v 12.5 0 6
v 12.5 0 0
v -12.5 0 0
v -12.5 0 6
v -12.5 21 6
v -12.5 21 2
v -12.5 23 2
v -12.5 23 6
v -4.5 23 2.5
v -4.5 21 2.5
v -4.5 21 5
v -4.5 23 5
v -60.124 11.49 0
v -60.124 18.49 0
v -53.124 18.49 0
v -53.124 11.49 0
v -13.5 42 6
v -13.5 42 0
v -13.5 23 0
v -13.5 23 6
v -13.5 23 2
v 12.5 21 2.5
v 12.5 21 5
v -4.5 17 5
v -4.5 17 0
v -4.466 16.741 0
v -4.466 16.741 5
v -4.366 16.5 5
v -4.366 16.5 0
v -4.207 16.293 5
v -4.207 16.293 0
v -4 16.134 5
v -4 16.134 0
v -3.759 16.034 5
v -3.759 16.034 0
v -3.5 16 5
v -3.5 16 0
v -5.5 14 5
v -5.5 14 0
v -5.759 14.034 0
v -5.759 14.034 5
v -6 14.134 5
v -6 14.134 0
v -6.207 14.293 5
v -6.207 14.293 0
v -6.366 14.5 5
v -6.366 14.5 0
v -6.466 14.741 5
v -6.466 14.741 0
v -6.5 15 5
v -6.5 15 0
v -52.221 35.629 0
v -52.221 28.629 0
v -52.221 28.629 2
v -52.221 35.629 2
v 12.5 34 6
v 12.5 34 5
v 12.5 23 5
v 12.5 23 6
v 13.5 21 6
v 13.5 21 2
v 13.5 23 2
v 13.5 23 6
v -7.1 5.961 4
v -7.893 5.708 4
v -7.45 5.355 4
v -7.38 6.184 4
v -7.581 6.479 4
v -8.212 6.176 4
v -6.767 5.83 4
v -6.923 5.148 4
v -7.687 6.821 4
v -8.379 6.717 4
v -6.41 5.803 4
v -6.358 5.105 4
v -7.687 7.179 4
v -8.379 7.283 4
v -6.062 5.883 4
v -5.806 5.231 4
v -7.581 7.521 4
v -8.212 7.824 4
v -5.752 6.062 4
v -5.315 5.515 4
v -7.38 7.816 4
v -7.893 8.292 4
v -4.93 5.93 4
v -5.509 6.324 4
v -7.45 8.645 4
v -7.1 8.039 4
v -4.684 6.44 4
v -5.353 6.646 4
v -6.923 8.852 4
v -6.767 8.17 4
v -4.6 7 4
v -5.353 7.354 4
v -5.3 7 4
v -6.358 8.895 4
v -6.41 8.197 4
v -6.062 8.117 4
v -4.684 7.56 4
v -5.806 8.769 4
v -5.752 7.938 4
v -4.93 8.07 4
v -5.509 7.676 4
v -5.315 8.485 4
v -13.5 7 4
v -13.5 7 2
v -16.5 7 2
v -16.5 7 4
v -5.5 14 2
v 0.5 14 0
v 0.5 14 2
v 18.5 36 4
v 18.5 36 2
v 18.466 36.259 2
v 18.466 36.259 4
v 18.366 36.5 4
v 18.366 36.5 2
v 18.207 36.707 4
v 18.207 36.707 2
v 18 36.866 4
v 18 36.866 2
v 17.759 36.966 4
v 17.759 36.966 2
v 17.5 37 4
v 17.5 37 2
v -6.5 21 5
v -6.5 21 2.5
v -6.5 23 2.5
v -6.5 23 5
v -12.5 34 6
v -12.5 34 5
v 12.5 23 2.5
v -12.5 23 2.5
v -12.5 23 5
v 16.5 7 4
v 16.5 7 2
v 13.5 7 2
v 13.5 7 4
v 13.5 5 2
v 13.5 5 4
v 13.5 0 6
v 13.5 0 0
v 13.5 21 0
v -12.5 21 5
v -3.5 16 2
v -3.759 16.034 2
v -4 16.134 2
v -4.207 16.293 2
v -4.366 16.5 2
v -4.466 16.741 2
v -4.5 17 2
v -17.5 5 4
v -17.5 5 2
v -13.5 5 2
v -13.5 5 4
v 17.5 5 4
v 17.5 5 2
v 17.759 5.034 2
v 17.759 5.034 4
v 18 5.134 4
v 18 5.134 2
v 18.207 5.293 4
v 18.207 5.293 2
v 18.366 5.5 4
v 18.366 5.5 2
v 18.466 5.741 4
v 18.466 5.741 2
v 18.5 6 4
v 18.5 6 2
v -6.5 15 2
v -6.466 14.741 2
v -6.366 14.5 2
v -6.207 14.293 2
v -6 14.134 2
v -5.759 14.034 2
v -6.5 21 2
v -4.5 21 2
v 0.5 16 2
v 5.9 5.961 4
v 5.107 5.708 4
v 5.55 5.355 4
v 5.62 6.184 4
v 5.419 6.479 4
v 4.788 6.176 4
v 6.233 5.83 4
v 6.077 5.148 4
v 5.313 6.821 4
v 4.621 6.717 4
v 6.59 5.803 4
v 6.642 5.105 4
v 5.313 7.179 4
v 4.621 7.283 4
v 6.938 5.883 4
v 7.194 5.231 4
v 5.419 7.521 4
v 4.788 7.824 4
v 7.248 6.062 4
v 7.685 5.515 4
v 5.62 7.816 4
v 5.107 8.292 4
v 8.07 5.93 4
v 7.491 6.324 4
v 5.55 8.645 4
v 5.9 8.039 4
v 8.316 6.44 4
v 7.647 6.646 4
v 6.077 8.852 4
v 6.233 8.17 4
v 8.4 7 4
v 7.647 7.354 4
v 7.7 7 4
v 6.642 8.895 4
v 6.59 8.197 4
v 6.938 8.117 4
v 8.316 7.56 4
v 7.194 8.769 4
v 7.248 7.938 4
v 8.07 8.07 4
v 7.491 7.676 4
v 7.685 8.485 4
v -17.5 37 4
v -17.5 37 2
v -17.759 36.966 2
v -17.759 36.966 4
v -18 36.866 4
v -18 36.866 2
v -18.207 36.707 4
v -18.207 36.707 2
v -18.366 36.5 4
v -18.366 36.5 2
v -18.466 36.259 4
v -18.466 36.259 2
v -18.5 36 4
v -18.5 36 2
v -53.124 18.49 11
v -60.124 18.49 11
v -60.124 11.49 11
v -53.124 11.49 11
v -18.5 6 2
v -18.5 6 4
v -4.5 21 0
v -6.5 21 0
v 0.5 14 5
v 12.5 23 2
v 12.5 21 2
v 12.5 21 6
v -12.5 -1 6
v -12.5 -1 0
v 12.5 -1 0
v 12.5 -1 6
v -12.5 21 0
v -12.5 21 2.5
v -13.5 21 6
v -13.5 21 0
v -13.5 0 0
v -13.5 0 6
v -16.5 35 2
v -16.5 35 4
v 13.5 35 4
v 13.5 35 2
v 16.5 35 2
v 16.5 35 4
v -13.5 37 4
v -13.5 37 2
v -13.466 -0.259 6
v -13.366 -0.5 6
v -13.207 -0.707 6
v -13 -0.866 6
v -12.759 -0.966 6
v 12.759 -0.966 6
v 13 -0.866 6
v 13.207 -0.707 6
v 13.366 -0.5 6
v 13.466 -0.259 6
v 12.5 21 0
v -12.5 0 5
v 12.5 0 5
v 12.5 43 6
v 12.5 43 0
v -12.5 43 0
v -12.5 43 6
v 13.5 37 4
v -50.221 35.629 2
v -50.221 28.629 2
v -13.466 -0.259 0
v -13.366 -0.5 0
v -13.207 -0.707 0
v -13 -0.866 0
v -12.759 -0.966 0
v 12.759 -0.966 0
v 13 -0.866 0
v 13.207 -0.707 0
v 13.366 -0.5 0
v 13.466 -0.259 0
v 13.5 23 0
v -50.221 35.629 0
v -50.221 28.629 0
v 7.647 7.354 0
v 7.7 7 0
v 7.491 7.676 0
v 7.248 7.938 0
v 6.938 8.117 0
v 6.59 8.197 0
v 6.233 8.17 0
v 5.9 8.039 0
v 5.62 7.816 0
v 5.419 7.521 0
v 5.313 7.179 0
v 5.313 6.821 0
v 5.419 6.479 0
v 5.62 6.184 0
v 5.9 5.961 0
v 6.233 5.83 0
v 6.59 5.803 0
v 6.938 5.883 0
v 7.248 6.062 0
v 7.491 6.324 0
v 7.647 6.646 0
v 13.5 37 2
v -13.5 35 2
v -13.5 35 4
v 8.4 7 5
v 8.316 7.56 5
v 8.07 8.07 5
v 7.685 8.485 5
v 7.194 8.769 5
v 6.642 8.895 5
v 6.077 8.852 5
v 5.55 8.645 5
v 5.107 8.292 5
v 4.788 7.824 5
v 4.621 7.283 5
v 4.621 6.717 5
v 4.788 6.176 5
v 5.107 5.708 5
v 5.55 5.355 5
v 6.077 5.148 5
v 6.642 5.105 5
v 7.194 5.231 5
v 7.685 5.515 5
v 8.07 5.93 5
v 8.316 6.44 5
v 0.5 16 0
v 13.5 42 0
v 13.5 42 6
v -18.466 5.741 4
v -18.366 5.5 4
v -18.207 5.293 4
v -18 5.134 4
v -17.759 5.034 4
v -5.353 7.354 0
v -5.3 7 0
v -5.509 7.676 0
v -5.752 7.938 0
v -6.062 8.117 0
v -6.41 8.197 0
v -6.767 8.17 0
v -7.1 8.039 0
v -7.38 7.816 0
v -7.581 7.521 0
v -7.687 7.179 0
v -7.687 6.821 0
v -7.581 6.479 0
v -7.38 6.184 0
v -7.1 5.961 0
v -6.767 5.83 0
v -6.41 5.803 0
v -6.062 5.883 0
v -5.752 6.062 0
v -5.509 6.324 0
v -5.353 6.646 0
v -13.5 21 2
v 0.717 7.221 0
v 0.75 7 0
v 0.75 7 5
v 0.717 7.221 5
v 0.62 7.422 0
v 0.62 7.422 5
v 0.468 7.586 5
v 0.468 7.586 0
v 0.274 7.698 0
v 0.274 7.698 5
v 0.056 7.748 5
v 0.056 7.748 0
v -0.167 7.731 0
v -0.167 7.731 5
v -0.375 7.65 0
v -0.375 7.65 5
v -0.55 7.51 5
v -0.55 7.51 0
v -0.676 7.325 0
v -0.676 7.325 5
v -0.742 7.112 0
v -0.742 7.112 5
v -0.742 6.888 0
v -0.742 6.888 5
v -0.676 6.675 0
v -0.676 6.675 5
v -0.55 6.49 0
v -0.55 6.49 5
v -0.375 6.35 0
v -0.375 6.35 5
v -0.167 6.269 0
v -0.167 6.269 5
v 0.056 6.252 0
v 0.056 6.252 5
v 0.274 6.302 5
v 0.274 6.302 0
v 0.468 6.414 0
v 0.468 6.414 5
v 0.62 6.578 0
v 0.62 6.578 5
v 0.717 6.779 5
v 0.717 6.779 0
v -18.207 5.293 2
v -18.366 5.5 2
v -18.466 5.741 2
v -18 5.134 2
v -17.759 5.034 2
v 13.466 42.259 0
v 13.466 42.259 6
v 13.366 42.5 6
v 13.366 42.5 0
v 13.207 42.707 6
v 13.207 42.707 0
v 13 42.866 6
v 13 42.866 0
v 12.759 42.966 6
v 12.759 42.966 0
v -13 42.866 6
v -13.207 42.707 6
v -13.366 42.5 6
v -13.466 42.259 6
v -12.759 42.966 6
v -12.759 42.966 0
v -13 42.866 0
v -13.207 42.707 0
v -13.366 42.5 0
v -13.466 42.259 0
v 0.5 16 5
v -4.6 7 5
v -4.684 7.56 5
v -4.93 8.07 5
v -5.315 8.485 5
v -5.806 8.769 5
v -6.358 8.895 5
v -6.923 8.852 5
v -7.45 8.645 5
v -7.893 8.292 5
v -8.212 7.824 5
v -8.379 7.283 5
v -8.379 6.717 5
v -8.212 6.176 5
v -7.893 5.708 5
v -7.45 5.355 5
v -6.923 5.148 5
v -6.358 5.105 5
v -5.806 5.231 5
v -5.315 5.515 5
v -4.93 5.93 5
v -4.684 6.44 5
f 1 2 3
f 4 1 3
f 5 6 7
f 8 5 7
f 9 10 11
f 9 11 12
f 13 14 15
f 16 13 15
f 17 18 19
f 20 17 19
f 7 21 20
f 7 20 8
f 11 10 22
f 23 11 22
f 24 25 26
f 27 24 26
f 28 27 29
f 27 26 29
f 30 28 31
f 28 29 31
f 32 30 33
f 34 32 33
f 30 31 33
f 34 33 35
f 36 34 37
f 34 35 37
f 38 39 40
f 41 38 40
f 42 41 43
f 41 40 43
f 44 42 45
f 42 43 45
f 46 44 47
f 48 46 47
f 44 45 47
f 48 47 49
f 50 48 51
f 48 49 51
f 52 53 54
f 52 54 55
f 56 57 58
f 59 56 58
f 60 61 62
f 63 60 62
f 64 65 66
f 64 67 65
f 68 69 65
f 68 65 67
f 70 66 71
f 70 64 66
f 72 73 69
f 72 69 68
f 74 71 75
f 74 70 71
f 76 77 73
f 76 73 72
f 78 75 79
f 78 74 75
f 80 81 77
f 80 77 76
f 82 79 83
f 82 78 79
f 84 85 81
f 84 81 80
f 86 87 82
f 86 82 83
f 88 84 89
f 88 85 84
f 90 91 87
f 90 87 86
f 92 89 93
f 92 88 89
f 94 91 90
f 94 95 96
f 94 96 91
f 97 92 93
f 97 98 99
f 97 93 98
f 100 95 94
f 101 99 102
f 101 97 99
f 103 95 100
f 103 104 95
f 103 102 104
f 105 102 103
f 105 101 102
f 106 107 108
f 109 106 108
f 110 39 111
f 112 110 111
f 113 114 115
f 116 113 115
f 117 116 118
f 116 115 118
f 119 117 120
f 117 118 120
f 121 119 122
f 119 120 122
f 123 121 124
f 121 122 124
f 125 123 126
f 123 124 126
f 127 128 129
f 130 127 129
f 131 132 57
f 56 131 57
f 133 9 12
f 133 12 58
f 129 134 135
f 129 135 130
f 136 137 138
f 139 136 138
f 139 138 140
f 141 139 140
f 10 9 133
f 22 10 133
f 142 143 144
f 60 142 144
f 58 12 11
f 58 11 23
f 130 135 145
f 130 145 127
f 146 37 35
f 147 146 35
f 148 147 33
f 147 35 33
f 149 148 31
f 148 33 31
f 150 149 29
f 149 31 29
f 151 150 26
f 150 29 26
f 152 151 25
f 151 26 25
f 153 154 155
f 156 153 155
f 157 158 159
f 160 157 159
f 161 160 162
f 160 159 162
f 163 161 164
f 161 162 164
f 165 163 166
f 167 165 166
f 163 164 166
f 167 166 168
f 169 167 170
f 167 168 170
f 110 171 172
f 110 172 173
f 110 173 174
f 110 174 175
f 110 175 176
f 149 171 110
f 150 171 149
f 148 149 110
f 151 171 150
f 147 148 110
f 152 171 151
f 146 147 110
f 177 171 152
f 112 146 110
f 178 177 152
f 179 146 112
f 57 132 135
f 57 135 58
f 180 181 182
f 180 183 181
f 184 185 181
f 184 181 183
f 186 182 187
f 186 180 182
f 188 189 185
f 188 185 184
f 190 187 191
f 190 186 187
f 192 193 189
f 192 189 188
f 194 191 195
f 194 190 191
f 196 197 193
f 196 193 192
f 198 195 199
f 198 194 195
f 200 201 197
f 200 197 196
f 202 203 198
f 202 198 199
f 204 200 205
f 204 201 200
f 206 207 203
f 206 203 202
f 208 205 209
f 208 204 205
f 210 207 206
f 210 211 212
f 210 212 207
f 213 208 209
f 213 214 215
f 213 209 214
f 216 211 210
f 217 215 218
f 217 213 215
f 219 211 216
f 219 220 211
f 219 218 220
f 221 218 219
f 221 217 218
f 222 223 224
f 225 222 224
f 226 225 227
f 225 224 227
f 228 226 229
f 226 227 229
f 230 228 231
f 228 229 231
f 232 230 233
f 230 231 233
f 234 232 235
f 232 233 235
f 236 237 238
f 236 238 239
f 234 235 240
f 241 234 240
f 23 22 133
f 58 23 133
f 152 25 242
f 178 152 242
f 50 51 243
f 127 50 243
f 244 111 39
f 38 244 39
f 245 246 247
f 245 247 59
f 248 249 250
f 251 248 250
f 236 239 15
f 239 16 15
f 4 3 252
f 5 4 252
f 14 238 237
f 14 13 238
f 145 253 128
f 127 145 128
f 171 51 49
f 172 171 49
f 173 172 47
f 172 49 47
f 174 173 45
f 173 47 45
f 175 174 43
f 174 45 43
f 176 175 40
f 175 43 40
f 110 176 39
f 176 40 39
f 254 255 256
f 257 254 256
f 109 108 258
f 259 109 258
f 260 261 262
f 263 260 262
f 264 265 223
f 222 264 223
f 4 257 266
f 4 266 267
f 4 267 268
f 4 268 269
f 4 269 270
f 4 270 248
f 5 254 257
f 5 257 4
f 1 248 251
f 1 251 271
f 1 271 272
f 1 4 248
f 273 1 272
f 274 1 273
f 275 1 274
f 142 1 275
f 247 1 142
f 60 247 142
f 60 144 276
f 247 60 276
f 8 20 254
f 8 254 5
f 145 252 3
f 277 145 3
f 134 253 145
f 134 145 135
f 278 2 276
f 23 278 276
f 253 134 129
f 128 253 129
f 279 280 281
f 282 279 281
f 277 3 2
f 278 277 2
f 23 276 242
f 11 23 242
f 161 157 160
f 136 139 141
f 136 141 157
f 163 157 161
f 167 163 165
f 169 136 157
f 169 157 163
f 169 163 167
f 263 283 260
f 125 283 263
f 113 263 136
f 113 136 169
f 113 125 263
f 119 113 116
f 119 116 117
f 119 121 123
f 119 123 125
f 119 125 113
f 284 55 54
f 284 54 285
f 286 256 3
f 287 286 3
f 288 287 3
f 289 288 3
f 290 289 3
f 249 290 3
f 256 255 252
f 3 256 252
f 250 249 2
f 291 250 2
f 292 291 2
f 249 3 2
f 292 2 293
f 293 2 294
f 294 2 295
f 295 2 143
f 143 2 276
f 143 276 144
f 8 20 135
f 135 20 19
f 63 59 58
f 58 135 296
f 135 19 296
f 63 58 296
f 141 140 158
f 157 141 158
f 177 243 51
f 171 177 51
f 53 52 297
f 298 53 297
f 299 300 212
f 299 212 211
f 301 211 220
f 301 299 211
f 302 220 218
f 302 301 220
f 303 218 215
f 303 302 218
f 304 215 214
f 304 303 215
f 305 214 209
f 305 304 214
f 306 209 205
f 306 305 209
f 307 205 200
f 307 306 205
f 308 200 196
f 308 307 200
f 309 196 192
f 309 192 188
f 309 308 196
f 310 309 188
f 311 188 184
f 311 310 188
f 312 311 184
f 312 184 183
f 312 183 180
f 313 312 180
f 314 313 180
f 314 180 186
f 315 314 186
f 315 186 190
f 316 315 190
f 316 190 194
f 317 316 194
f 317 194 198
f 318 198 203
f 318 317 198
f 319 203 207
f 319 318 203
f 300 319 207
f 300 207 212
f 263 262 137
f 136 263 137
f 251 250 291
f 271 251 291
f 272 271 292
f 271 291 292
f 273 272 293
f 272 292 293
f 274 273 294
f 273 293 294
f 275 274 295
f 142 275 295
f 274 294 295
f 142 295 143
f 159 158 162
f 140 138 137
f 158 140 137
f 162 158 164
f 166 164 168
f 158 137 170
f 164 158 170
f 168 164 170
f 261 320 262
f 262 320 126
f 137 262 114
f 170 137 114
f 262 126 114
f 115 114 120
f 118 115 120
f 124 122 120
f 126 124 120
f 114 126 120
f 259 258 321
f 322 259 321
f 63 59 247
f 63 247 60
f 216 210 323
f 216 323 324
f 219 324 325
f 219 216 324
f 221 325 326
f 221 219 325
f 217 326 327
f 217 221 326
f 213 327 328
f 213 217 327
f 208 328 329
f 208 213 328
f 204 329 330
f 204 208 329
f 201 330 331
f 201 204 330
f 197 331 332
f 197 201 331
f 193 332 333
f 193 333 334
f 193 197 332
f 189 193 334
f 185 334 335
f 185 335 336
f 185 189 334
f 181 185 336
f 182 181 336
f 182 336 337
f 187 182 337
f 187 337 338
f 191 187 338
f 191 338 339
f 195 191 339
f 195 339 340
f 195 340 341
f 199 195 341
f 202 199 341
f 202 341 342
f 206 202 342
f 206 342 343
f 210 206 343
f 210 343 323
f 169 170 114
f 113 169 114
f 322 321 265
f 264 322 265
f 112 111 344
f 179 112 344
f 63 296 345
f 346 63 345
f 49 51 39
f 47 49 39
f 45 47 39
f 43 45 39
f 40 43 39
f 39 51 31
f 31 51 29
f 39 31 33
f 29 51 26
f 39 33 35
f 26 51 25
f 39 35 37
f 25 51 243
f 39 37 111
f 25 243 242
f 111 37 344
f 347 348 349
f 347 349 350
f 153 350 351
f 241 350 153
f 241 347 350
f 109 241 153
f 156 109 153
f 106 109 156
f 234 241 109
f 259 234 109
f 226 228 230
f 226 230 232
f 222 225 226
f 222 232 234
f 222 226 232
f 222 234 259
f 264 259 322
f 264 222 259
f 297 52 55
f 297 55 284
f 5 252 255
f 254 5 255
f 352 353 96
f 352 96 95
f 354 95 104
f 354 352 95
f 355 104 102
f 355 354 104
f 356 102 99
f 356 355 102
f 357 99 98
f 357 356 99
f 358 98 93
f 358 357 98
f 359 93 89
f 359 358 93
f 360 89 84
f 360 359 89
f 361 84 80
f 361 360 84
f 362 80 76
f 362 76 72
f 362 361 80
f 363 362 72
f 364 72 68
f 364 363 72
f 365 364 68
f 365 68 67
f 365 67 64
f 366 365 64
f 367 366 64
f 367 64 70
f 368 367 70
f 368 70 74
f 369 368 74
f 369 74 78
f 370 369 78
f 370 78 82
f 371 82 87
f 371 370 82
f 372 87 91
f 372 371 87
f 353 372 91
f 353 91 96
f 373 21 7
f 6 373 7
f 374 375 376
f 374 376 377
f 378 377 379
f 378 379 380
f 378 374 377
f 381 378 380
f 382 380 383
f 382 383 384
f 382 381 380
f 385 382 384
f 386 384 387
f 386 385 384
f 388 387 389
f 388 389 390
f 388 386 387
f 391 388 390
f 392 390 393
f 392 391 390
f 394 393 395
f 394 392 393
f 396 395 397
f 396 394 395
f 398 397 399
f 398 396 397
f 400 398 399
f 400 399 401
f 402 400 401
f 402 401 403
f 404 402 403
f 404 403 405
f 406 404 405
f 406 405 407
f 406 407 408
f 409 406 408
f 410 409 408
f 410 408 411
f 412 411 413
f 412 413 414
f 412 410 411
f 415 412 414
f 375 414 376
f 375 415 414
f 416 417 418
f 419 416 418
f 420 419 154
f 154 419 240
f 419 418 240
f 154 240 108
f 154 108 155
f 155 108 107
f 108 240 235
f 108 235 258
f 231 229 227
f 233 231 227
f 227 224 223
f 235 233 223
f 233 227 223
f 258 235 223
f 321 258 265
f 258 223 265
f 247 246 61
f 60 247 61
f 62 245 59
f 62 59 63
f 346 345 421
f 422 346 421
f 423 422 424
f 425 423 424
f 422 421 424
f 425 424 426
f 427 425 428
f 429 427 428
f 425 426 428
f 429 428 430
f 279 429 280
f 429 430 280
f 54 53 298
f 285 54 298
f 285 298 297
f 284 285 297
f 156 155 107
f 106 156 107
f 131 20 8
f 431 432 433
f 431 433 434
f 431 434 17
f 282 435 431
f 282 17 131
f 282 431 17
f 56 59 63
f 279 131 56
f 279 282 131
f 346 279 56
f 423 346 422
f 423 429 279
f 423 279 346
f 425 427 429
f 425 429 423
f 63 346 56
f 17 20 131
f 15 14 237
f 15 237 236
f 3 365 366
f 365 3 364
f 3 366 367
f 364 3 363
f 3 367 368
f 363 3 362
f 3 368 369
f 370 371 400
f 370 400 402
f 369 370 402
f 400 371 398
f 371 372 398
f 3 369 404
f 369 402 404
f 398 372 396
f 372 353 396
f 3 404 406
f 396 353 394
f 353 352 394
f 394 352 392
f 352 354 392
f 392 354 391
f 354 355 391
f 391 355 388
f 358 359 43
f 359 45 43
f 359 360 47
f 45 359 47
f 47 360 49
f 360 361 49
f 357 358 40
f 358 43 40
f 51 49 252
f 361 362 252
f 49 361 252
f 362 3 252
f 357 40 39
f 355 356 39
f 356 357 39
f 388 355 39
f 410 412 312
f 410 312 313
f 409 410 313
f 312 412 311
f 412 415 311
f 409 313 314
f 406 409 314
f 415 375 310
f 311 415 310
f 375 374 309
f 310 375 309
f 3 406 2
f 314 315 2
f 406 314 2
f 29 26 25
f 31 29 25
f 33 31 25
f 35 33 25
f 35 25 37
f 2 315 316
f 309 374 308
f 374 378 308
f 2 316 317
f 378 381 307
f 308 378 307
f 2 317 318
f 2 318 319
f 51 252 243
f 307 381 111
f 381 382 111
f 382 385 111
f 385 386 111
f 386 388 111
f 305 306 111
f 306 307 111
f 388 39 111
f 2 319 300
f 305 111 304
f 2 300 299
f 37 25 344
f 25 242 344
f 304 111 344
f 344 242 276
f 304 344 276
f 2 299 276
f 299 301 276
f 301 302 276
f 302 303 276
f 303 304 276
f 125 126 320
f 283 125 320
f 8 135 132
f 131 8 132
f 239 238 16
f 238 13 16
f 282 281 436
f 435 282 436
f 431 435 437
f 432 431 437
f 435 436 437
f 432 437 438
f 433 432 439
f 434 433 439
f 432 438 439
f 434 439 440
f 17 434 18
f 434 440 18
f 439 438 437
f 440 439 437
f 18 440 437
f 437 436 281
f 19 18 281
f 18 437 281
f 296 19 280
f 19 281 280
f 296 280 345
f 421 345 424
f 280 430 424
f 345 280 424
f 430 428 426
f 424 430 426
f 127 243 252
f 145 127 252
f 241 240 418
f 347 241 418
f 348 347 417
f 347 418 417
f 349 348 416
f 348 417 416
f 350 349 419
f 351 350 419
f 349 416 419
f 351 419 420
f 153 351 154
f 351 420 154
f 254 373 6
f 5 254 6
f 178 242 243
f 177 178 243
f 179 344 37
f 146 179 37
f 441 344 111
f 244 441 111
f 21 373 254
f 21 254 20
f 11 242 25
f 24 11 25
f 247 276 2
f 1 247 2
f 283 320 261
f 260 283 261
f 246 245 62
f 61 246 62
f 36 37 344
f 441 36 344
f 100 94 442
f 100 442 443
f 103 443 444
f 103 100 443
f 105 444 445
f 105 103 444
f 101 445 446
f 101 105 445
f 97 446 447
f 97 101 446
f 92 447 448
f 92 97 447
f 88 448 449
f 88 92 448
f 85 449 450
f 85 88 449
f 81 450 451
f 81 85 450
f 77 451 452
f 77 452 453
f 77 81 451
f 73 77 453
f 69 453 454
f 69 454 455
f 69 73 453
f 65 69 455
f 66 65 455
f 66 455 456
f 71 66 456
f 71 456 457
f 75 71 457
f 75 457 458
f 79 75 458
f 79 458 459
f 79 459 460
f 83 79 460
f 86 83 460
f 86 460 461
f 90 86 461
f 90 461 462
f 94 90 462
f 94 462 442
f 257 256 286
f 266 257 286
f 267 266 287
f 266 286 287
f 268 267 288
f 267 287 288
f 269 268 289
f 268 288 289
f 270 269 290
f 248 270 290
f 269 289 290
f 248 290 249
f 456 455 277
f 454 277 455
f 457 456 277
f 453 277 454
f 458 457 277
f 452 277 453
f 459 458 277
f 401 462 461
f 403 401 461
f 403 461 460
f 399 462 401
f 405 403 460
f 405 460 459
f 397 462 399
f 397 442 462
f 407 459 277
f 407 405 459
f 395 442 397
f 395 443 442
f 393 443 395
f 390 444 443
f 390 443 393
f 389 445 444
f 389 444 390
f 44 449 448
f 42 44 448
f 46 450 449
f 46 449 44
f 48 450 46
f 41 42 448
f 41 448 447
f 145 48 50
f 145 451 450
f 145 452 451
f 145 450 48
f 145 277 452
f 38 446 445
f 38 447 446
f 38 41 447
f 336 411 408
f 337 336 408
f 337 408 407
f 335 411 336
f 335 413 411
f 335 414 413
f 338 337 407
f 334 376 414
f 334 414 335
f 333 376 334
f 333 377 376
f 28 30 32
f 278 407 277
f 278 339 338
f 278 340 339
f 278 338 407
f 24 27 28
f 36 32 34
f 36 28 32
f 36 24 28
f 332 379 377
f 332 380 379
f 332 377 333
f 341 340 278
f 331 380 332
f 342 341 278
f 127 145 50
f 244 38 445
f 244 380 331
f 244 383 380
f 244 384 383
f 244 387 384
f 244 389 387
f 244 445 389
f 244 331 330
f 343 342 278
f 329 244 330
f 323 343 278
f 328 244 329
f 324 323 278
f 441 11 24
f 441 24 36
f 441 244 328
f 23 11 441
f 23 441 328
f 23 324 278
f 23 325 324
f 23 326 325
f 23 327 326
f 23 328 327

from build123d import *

# Parameters (mm, degrees)
F1_DEPTH  = 6
F0_R      = 1.9
F0_R_2    = 0.75
F2_DEPTH  = 5
F3_START  = 2
F3_DEPTH  = 2
F4_START  = 2
F0_W      = 1
F0_H      = 2
F4_DEPTH  = 4
F5_START  = 2.5
F0_W_2    = 6
F5_DEPTH  = 2.5
F0_W_3    = 17
F6_DEPTH  = 2
F0_R_3    = 1.2
F7_DEPTH  = 4
F8_W      = 2
F8_H      = 7
F9_DEPTH  = 2
F8_W_2    = 7
F10_DEPTH = 9


with BuildPart() as f1:
    # F0 (on Top) → F1 (new body)
    with BuildSketch(Plane.XY):
        with BuildLine():
            Line((12.5, 0), (0, 0))
            Line((0, 0), (-12.5, 0))
            Line((-12.5, 0), (-12.5, 21))
            Line((-12.5, 21), (-13.5, 21))
            Line((-13.5, 21), (-13.5, 7))
            Line((-13.5, 7), (-13.5, 5))
            Line((-13.5, 5), (-13.5, 0))
            ThreePointArc((-13.5, 0), (-13.2071067812, -0.7071067812), (-12.5, -1))
            Line((-12.5, -1), (0, -1))
            Line((0, -1), (12.5, -1))
            ThreePointArc((12.5, -1), (13.2071067812, -0.7071067812), (13.5, 0))
            Line((13.5, 0), (13.5, 5))
            Line((13.5, 5), (13.5, 7))
            Line((13.5, 7), (13.5, 21))
            Line((13.5, 21), (12.5, 21))
            Line((12.5, 21), (12.5, 0))
        make_face()
    extrude(amount=F1_DEPTH)


with BuildPart() as f1b:
    # F0 (on Top) → F1, piece 2 (new body)
    with BuildSketch(Plane.XY):
        with BuildLine():
            Line((-13.5, 23), (-12.5, 23))
            Line((-12.5, 23), (-12.5, 34))
            Line((-12.5, 34), (0, 34))
            Line((0, 34), (12.5, 34))
            Line((12.5, 34), (12.5, 23))
            Line((12.5, 23), (13.5, 23))
            Line((13.5, 23), (13.5, 35))
            Line((13.5, 35), (13.5, 37))
            Line((13.5, 37), (13.5, 42))
            ThreePointArc((13.5, 42), (13.2071067812, 42.7071067812), (12.5, 43))
            Line((12.5, 43), (0, 43))
            Line((0, 43), (-12.5, 43))
            ThreePointArc((-12.5, 43), (-13.2071067812, 42.7071067812), (-13.5, 42))
            Line((-13.5, 42), (-13.5, 37))
            Line((-13.5, 37), (-13.5, 35))
            Line((-13.5, 35), (-13.5, 23))
        make_face()
    extrude(amount=F1_DEPTH)

    # F0 (on Top) → F2, piece 2 (join)
    with BuildSketch(Plane.XY):
        Polygon((-12.5, 34), (-12.5, 23), (-6.5, 23), (-4.5, 23), (12.5, 23), (12.5, 34), (0, 34), align=None)
    extrude(amount=F2_DEPTH)


with BuildPart() as f2:
    # F0 (on Top) → F2 (new body)
    with BuildSketch(Plane.XY):
        with BuildLine():
            Line((-12.5, 0), (0, 0))
            Line((0, 0), (12.5, 0))
            Line((12.5, 0), (12.5, 21))
            Line((12.5, 21), (-4.5, 21))
            Line((-4.5, 21), (-4.5, 17))
            ThreePointArc((-4.5, 17), (-4.2071067812, 16.2928932188), (-3.5, 16))
            Line((-3.5, 16), (0.5, 16))
            Line((0.5, 16), (0.5, 14))
            Line((0.5, 14), (-2.5, 14))
            Line((-2.5, 14), (-5.5, 14))
            ThreePointArc((-5.5, 14), (-6.2071067812, 14.2928932188), (-6.5, 15))
            Line((-6.5, 15), (-6.5, 21))
            Line((-6.5, 21), (-12.5, 21))
            Line((-12.5, 21), (-12.5, 0))
        make_face()
        with Locations((-6.5, 7)):
            Circle(F0_R, mode=Mode.SUBTRACT)
        with Locations((0, 7)):
            Circle(F0_R_2, mode=Mode.SUBTRACT)
        with Locations((6.5, 7)):
            Circle(F0_R, mode=Mode.SUBTRACT)
    extrude(amount=F2_DEPTH)

    # F0 (on Top) → F7 (join)
    with BuildSketch(Plane.XY):
        with Locations((-6.5, 7)):
            Circle(F0_R)
        with Locations((-6.5, 7)):
            Circle(F0_R_3, mode=Mode.SUBTRACT)
        with Locations((6.5, 7)):
            Circle(F0_R)
        with Locations((6.5, 7)):
            Circle(F0_R_3, mode=Mode.SUBTRACT)
    extrude(amount=F7_DEPTH)


with BuildPart() as f3:
    # F0 (on Top) → F3 (new body)
    with BuildSketch(Plane.XY.offset(F3_START)):
        with BuildLine():
            Line((-13.5, 5), (-13.5, 7))
            Line((-13.5, 7), (-16.5, 7))
            Line((-16.5, 7), (-16.5, 35))
            Line((-16.5, 35), (-13.5, 35))
            Line((-13.5, 35), (-13.5, 37))
            Line((-13.5, 37), (-17.5, 37))
            ThreePointArc((-17.5, 37), (-18.2071067812, 36.7071067812), (-18.5, 36))
            Line((-18.5, 36), (-18.5, 6))
            ThreePointArc((-18.5, 6), (-18.2071067812, 5.2928932188), (-17.5, 5))
            Line((-17.5, 5), (-13.5, 5))
        make_face()
    extrude(amount=F3_DEPTH)


with BuildPart() as f3b:
    # F0 (on Top) → F3, piece 2 (new body)
    with BuildSketch(Plane.XY.offset(F3_START)):
        with BuildLine():
            Line((16.5, 7), (13.5, 7))
            Line((13.5, 7), (13.5, 5))
            Line((13.5, 5), (17.5, 5))
            ThreePointArc((17.5, 5), (18.2071067812, 5.2928932188), (18.5, 6))
            Line((18.5, 6), (18.5, 36))
            ThreePointArc((18.5, 36), (18.2071067812, 36.7071067812), (17.5, 37))
            Line((17.5, 37), (13.5, 37))
            Line((13.5, 37), (13.5, 35))
            Line((13.5, 35), (16.5, 35))
            Line((16.5, 35), (16.5, 7))
        make_face()
    extrude(amount=F3_DEPTH)


with BuildPart() as f4:
    # F0 (on Top) → F4 (new body)
    with BuildSketch(Plane.XY.offset(F4_START)):
        with Locations((-13, 22)):
            Rectangle(F0_W, F0_H)
    extrude(amount=F4_DEPTH)


with BuildPart() as f4b:
    # F0 (on Top) → F4, piece 2 (new body)
    with BuildSketch(Plane.XY.offset(F4_START)):
        with Locations((13, 22)):
            Rectangle(F0_W, F0_H)
    extrude(amount=F4_DEPTH)


with BuildPart() as f5:
    # F0 (on Top) → F5 (new body)
    with BuildSketch(Plane.XY.offset(F5_START)):
        with Locations((-9.5, 22)):
            Rectangle(F0_W_2, F0_H)
    extrude(amount=F5_DEPTH)


with BuildPart() as f5b:
    # F0 (on Top) → F5, piece 2 (new body)
    with BuildSketch(Plane.XY.offset(F5_START)):
        with Locations((4, 22)):
            Rectangle(F0_W_3, F0_H)
    extrude(amount=F5_DEPTH)


with BuildPart() as f6:
    # F0 (on Top) → F6 (new body)
    with BuildSketch(Plane.XY):
        with BuildLine():
            Line((-4.5, 21), (-6.5, 21))
            Line((-6.5, 21), (-6.5, 15))
            ThreePointArc((-6.5, 15), (-6.2071067812, 14.2928932188), (-5.5, 14))
            Line((-5.5, 14), (-2.5, 14))
            Line((-2.5, 14), (0.5, 14))
            Line((0.5, 14), (0.5, 16))
            Line((0.5, 16), (-3.5, 16))
            ThreePointArc((-3.5, 16), (-4.2071067812, 16.2928932188), (-4.5, 17))
            Line((-4.5, 17), (-4.5, 21))
        make_face()
    extrude(amount=F6_DEPTH)


with BuildPart() as f9:
    # F8 (on Top) → F9 (new body)
    with BuildSketch(Plane.XY):
        with Locations((-51.2206767944, 32.1291023865)):
            Rectangle(F8_W, F8_H)
    extrude(amount=F9_DEPTH)


with BuildPart() as f9b:
    # F8 (on Top) → F9, piece 2 (new body)
    with BuildSketch(Plane.XY):
        with Locations((-56.6243078709, 14.9900683984)):
            Rectangle(F8_W_2, F8_H)
    extrude(amount=F9_DEPTH)

    # F10 (add): a face of the model
    f10_faces = [f9b.faces().sort_by_distance(p)[0] for p in [
        (-56.6243078709, 14.9900683984, 2),
    ]]
    extrude(f10_faces, amount=F10_DEPTH)


solid = Compound([f1.part, f1b.part, f2.part, f3.part, f3b.part, f4.part, f4b.part, f5.part, f5b.part, f6.part, f9.part, f9b.part])
